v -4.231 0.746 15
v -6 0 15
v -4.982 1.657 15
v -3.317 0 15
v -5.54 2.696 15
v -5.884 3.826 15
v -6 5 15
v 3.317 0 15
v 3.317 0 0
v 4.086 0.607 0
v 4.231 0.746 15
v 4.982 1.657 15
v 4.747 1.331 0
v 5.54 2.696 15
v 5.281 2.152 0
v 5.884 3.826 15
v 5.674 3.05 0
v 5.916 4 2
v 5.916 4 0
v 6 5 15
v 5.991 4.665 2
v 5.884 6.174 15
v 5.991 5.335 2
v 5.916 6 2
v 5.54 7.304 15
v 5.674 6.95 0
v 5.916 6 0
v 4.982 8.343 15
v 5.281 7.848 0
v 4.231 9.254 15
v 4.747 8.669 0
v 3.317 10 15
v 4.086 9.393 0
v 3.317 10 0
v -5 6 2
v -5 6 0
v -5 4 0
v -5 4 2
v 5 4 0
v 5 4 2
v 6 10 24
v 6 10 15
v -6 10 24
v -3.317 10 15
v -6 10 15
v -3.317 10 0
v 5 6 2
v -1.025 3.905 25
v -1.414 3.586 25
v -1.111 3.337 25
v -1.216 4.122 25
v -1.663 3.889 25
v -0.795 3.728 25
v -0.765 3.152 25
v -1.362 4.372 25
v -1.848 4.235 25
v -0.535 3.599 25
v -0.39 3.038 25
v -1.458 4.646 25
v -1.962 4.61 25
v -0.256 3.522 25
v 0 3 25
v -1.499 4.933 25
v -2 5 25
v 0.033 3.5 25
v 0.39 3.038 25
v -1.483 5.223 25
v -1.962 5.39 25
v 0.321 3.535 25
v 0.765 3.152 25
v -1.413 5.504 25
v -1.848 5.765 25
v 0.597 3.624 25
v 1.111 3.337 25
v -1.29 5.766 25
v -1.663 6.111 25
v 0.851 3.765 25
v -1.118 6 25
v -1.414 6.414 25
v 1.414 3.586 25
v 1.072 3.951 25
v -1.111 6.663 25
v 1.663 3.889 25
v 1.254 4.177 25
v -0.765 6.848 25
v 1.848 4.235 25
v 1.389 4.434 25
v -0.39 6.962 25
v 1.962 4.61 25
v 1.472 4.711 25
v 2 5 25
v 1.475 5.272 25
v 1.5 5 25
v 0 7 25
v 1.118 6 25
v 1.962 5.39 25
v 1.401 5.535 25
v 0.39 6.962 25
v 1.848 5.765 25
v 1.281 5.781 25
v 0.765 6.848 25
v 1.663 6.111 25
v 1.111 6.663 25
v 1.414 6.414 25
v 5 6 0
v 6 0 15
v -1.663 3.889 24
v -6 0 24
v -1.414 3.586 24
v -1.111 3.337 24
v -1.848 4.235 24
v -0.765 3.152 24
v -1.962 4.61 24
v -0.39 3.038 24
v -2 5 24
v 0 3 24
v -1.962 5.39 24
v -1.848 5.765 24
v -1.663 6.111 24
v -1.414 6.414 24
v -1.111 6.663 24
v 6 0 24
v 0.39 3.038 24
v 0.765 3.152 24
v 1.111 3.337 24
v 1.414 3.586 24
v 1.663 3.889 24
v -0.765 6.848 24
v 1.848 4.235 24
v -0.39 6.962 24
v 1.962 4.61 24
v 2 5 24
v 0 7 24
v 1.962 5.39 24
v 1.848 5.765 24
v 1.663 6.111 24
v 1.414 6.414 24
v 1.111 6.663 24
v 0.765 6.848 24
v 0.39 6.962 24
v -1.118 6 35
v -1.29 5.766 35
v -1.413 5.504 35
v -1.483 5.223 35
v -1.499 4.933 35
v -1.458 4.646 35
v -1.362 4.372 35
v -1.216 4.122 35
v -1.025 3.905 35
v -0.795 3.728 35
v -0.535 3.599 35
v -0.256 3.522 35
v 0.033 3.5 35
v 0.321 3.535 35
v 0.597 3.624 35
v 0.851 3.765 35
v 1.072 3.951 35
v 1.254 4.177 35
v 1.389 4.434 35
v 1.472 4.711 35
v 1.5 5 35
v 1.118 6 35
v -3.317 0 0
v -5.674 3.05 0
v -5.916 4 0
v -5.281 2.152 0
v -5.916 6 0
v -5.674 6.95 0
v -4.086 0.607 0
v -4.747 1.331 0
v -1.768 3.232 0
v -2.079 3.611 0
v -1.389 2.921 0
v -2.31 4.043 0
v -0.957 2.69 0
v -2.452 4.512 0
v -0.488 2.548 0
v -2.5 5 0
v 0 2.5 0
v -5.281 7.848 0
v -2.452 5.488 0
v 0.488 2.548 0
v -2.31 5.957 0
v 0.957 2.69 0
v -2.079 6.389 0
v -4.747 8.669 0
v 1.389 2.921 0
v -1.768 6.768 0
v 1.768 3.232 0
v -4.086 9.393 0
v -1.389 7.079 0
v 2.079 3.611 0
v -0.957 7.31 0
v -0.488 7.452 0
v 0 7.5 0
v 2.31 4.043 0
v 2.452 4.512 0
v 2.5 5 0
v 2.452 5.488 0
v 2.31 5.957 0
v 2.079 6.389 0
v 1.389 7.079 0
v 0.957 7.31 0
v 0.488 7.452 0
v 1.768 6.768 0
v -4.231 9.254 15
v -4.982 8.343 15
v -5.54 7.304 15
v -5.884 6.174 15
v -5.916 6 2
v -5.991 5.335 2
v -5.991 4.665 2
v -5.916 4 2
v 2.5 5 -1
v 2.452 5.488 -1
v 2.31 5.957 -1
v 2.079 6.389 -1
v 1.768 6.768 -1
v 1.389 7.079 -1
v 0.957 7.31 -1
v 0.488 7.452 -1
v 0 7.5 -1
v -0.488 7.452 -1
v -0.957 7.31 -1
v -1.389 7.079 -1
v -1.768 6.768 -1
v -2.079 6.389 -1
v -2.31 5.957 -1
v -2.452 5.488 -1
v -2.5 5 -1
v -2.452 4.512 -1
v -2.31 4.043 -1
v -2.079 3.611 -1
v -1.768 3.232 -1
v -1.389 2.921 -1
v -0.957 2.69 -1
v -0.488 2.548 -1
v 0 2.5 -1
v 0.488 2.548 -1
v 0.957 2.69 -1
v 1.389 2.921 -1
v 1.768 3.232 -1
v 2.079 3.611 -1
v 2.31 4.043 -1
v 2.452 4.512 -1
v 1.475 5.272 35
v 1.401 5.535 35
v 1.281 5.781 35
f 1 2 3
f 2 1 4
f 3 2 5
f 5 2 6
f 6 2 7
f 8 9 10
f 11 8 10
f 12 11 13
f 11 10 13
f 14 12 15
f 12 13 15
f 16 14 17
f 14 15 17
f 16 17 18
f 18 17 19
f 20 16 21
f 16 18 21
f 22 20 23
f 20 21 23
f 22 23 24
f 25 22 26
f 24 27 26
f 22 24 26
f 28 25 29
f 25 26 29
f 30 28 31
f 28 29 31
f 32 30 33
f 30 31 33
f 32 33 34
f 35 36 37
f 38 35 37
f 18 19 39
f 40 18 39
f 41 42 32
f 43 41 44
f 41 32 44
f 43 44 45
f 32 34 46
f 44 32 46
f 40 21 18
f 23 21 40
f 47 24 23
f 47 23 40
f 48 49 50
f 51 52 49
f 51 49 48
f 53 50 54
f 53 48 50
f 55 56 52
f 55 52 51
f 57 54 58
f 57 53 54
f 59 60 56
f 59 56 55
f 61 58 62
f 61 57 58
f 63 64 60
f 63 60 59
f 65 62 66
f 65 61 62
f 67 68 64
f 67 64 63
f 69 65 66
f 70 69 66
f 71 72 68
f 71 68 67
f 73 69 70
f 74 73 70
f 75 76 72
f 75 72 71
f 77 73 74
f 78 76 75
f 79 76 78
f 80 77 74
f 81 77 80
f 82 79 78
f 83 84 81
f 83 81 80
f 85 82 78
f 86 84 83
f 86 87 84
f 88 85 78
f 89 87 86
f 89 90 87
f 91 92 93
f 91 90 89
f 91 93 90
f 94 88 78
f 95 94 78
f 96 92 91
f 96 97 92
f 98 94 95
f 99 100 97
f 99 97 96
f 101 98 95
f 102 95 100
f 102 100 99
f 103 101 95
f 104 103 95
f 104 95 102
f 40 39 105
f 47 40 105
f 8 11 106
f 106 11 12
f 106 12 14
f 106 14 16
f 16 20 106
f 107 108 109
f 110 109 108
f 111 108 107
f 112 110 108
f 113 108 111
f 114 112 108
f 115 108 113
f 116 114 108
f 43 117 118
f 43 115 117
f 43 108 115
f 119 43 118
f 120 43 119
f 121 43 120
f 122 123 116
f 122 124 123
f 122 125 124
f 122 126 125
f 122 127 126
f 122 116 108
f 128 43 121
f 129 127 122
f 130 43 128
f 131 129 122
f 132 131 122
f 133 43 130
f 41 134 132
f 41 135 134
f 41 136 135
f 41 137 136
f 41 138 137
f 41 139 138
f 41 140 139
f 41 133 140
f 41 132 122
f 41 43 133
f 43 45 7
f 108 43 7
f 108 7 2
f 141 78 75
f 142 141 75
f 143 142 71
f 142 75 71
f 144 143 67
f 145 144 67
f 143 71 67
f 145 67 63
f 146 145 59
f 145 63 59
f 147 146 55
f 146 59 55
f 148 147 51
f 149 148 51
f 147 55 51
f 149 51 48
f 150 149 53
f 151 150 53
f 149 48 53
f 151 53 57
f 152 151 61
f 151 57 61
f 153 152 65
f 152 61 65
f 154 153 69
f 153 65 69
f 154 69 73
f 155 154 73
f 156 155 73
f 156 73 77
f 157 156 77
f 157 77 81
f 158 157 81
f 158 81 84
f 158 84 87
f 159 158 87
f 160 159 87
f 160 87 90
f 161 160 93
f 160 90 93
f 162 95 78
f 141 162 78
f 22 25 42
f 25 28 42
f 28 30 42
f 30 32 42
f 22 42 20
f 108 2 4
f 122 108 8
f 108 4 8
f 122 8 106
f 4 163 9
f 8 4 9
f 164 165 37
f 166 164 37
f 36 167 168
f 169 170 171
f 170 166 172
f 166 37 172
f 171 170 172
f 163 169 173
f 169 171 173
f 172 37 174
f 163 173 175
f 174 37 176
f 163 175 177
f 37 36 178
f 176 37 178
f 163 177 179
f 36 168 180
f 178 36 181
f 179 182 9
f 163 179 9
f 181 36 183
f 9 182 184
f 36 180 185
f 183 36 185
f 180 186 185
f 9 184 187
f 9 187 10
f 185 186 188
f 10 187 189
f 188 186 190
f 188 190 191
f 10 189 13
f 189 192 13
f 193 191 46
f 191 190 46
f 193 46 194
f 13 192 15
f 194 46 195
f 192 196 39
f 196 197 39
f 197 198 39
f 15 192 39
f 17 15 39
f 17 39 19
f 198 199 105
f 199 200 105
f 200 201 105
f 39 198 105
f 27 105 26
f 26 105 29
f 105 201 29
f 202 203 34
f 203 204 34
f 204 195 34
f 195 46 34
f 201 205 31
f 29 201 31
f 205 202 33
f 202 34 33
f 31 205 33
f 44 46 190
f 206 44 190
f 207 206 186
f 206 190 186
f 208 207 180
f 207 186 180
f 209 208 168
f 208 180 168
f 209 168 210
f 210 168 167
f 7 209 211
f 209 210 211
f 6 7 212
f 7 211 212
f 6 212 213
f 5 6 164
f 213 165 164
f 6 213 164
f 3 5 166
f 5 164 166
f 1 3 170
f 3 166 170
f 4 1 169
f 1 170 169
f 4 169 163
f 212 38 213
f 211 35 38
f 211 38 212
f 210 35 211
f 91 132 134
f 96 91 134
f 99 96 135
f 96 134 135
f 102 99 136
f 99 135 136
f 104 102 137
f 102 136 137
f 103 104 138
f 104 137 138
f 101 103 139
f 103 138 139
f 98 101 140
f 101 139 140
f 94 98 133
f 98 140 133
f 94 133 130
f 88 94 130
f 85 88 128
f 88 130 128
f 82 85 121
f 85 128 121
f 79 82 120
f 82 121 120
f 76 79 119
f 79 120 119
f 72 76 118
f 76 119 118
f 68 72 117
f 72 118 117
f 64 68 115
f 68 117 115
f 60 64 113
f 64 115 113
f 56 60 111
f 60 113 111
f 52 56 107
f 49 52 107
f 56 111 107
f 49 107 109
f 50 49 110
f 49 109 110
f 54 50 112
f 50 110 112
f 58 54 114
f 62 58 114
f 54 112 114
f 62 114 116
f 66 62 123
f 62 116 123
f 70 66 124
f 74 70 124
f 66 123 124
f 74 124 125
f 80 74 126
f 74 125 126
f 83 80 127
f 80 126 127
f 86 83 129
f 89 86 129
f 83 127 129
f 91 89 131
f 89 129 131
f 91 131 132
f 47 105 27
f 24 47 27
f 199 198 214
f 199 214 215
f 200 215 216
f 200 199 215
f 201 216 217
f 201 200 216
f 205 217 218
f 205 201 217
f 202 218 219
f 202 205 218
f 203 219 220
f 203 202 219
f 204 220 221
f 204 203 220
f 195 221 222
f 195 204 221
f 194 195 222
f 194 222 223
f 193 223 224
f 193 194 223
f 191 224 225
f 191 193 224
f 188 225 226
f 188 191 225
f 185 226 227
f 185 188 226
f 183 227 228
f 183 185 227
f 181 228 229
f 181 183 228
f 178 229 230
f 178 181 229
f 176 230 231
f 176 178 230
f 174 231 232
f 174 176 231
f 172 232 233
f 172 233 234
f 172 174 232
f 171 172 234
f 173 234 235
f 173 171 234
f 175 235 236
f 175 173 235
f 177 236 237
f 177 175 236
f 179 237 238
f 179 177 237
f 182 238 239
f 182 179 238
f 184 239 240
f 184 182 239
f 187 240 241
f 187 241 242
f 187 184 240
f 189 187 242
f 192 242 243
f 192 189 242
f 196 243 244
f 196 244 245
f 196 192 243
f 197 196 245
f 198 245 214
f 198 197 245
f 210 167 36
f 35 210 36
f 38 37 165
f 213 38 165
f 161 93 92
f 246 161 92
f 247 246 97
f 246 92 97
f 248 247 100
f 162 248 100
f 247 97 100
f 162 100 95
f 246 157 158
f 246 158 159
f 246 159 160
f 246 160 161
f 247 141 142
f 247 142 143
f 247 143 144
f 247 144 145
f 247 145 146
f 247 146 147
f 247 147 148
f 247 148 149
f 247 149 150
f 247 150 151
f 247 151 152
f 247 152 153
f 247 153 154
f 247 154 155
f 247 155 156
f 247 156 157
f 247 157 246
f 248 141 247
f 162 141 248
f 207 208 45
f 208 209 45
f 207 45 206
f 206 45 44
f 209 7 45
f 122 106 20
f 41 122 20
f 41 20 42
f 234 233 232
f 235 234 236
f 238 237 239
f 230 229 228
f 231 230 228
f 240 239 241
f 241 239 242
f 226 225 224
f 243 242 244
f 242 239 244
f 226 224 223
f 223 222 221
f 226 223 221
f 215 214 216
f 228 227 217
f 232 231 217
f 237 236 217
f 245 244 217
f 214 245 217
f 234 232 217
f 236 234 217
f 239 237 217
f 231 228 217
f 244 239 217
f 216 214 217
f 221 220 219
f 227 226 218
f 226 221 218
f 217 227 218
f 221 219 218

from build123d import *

# Parameters (mm, degrees)
EXTRUDE_1_DEPTH     = 15
SKETCH_3_R          = 2.5
EXTRUDE_2_DEPTH     = 1
CUT_EXTRUDE_1_DEPTH = 2
EXTRUDE_3_DEPTH     = 9
SKETCH_7_R          = 2
EXTRUDE_4_DEPTH     = 1
EXTRUDE_5_DEPTH     = 10


with BuildPart() as part:
    # 草图1 → 凸台-拉伸1 (new body)
    with BuildSketch(Plane.XY):
        with BuildLine():
            Line((-3.31662479, 0), (3.31662479, 0))
            ThreePointArc((3.31662479, 0), (6, 5), (3.31662479, 10))
            Line((3.31662479, 10), (-3.31662479, 10))
            ThreePointArc((-3.31662479, 10), (-6, 5), (-3.31662479, 0))
        make_face()
    extrude(amount=EXTRUDE_1_DEPTH)

    # 草图3 → 凸台-拉伸2 (add)
    with BuildSketch(Plane.XY):
        with Locations((0, 5)):
            Circle(SKETCH_3_R)
    extrude(amount=-EXTRUDE_2_DEPTH)

    # 草图4 → 切除-拉伸1 (cut)
    with BuildSketch(Plane.XY):
        with BuildLine():
            Line((5, 6), (5.916079783, 6))
            ThreePointArc((5.916079783, 6), (6, 5), (5.916079783, 4))
            Line((5.916079783, 4), (5, 4))
            Line((5, 4), (5, 5))
            Line((5, 5), (5, 6))
        make_face()
        with BuildLine():
            Line((-5, 4), (-5.916079783, 4))
            ThreePointArc((-5.916079783, 4), (-6, 5), (-5.916079783, 6))
            Line((-5.916079783, 6), (-5, 6))
            Line((-5, 6), (-5, 5))
            Line((-5, 5), (-5, 4))
        make_face()
    extrude(amount=CUT_EXTRUDE_1_DEPTH, mode=Mode.SUBTRACT)

    # 草图6 → 凸台-拉伸3 (add)
    with BuildSketch(Plane.XY.offset(15)):
        Polygon((0, 0), (6, 0), (6, 5), (6, 10), (-6, 10), (-6, 5), (-6, 0), align=None)
    extrude(amount=EXTRUDE_3_DEPTH)

    # 草图7 → 凸台-拉伸4 (add)
    with BuildSketch(Plane.XY.offset(24)):
        with Locations((0, 5)):
            Circle(SKETCH_7_R)
    extrude(amount=EXTRUDE_4_DEPTH)

    # 草图8 → 凸台-拉伸5 (add)
    with BuildSketch(Plane.XY.offset(25)):
        with BuildLine():
            Line((1.118033989, 6), (0, 6))
            Line((0, 6), (-1.118033989, 6))
            ThreePointArc((-1.118033989, 6), (-0.535233135, 3.598741462), (1.5, 5))
            ThreePointArc((1.5, 5), (1.401258538, 5.535233135), (1.118033989, 6))
        make_face()
    extrude(amount=EXTRUDE_5_DEPTH)


solid = part.part
